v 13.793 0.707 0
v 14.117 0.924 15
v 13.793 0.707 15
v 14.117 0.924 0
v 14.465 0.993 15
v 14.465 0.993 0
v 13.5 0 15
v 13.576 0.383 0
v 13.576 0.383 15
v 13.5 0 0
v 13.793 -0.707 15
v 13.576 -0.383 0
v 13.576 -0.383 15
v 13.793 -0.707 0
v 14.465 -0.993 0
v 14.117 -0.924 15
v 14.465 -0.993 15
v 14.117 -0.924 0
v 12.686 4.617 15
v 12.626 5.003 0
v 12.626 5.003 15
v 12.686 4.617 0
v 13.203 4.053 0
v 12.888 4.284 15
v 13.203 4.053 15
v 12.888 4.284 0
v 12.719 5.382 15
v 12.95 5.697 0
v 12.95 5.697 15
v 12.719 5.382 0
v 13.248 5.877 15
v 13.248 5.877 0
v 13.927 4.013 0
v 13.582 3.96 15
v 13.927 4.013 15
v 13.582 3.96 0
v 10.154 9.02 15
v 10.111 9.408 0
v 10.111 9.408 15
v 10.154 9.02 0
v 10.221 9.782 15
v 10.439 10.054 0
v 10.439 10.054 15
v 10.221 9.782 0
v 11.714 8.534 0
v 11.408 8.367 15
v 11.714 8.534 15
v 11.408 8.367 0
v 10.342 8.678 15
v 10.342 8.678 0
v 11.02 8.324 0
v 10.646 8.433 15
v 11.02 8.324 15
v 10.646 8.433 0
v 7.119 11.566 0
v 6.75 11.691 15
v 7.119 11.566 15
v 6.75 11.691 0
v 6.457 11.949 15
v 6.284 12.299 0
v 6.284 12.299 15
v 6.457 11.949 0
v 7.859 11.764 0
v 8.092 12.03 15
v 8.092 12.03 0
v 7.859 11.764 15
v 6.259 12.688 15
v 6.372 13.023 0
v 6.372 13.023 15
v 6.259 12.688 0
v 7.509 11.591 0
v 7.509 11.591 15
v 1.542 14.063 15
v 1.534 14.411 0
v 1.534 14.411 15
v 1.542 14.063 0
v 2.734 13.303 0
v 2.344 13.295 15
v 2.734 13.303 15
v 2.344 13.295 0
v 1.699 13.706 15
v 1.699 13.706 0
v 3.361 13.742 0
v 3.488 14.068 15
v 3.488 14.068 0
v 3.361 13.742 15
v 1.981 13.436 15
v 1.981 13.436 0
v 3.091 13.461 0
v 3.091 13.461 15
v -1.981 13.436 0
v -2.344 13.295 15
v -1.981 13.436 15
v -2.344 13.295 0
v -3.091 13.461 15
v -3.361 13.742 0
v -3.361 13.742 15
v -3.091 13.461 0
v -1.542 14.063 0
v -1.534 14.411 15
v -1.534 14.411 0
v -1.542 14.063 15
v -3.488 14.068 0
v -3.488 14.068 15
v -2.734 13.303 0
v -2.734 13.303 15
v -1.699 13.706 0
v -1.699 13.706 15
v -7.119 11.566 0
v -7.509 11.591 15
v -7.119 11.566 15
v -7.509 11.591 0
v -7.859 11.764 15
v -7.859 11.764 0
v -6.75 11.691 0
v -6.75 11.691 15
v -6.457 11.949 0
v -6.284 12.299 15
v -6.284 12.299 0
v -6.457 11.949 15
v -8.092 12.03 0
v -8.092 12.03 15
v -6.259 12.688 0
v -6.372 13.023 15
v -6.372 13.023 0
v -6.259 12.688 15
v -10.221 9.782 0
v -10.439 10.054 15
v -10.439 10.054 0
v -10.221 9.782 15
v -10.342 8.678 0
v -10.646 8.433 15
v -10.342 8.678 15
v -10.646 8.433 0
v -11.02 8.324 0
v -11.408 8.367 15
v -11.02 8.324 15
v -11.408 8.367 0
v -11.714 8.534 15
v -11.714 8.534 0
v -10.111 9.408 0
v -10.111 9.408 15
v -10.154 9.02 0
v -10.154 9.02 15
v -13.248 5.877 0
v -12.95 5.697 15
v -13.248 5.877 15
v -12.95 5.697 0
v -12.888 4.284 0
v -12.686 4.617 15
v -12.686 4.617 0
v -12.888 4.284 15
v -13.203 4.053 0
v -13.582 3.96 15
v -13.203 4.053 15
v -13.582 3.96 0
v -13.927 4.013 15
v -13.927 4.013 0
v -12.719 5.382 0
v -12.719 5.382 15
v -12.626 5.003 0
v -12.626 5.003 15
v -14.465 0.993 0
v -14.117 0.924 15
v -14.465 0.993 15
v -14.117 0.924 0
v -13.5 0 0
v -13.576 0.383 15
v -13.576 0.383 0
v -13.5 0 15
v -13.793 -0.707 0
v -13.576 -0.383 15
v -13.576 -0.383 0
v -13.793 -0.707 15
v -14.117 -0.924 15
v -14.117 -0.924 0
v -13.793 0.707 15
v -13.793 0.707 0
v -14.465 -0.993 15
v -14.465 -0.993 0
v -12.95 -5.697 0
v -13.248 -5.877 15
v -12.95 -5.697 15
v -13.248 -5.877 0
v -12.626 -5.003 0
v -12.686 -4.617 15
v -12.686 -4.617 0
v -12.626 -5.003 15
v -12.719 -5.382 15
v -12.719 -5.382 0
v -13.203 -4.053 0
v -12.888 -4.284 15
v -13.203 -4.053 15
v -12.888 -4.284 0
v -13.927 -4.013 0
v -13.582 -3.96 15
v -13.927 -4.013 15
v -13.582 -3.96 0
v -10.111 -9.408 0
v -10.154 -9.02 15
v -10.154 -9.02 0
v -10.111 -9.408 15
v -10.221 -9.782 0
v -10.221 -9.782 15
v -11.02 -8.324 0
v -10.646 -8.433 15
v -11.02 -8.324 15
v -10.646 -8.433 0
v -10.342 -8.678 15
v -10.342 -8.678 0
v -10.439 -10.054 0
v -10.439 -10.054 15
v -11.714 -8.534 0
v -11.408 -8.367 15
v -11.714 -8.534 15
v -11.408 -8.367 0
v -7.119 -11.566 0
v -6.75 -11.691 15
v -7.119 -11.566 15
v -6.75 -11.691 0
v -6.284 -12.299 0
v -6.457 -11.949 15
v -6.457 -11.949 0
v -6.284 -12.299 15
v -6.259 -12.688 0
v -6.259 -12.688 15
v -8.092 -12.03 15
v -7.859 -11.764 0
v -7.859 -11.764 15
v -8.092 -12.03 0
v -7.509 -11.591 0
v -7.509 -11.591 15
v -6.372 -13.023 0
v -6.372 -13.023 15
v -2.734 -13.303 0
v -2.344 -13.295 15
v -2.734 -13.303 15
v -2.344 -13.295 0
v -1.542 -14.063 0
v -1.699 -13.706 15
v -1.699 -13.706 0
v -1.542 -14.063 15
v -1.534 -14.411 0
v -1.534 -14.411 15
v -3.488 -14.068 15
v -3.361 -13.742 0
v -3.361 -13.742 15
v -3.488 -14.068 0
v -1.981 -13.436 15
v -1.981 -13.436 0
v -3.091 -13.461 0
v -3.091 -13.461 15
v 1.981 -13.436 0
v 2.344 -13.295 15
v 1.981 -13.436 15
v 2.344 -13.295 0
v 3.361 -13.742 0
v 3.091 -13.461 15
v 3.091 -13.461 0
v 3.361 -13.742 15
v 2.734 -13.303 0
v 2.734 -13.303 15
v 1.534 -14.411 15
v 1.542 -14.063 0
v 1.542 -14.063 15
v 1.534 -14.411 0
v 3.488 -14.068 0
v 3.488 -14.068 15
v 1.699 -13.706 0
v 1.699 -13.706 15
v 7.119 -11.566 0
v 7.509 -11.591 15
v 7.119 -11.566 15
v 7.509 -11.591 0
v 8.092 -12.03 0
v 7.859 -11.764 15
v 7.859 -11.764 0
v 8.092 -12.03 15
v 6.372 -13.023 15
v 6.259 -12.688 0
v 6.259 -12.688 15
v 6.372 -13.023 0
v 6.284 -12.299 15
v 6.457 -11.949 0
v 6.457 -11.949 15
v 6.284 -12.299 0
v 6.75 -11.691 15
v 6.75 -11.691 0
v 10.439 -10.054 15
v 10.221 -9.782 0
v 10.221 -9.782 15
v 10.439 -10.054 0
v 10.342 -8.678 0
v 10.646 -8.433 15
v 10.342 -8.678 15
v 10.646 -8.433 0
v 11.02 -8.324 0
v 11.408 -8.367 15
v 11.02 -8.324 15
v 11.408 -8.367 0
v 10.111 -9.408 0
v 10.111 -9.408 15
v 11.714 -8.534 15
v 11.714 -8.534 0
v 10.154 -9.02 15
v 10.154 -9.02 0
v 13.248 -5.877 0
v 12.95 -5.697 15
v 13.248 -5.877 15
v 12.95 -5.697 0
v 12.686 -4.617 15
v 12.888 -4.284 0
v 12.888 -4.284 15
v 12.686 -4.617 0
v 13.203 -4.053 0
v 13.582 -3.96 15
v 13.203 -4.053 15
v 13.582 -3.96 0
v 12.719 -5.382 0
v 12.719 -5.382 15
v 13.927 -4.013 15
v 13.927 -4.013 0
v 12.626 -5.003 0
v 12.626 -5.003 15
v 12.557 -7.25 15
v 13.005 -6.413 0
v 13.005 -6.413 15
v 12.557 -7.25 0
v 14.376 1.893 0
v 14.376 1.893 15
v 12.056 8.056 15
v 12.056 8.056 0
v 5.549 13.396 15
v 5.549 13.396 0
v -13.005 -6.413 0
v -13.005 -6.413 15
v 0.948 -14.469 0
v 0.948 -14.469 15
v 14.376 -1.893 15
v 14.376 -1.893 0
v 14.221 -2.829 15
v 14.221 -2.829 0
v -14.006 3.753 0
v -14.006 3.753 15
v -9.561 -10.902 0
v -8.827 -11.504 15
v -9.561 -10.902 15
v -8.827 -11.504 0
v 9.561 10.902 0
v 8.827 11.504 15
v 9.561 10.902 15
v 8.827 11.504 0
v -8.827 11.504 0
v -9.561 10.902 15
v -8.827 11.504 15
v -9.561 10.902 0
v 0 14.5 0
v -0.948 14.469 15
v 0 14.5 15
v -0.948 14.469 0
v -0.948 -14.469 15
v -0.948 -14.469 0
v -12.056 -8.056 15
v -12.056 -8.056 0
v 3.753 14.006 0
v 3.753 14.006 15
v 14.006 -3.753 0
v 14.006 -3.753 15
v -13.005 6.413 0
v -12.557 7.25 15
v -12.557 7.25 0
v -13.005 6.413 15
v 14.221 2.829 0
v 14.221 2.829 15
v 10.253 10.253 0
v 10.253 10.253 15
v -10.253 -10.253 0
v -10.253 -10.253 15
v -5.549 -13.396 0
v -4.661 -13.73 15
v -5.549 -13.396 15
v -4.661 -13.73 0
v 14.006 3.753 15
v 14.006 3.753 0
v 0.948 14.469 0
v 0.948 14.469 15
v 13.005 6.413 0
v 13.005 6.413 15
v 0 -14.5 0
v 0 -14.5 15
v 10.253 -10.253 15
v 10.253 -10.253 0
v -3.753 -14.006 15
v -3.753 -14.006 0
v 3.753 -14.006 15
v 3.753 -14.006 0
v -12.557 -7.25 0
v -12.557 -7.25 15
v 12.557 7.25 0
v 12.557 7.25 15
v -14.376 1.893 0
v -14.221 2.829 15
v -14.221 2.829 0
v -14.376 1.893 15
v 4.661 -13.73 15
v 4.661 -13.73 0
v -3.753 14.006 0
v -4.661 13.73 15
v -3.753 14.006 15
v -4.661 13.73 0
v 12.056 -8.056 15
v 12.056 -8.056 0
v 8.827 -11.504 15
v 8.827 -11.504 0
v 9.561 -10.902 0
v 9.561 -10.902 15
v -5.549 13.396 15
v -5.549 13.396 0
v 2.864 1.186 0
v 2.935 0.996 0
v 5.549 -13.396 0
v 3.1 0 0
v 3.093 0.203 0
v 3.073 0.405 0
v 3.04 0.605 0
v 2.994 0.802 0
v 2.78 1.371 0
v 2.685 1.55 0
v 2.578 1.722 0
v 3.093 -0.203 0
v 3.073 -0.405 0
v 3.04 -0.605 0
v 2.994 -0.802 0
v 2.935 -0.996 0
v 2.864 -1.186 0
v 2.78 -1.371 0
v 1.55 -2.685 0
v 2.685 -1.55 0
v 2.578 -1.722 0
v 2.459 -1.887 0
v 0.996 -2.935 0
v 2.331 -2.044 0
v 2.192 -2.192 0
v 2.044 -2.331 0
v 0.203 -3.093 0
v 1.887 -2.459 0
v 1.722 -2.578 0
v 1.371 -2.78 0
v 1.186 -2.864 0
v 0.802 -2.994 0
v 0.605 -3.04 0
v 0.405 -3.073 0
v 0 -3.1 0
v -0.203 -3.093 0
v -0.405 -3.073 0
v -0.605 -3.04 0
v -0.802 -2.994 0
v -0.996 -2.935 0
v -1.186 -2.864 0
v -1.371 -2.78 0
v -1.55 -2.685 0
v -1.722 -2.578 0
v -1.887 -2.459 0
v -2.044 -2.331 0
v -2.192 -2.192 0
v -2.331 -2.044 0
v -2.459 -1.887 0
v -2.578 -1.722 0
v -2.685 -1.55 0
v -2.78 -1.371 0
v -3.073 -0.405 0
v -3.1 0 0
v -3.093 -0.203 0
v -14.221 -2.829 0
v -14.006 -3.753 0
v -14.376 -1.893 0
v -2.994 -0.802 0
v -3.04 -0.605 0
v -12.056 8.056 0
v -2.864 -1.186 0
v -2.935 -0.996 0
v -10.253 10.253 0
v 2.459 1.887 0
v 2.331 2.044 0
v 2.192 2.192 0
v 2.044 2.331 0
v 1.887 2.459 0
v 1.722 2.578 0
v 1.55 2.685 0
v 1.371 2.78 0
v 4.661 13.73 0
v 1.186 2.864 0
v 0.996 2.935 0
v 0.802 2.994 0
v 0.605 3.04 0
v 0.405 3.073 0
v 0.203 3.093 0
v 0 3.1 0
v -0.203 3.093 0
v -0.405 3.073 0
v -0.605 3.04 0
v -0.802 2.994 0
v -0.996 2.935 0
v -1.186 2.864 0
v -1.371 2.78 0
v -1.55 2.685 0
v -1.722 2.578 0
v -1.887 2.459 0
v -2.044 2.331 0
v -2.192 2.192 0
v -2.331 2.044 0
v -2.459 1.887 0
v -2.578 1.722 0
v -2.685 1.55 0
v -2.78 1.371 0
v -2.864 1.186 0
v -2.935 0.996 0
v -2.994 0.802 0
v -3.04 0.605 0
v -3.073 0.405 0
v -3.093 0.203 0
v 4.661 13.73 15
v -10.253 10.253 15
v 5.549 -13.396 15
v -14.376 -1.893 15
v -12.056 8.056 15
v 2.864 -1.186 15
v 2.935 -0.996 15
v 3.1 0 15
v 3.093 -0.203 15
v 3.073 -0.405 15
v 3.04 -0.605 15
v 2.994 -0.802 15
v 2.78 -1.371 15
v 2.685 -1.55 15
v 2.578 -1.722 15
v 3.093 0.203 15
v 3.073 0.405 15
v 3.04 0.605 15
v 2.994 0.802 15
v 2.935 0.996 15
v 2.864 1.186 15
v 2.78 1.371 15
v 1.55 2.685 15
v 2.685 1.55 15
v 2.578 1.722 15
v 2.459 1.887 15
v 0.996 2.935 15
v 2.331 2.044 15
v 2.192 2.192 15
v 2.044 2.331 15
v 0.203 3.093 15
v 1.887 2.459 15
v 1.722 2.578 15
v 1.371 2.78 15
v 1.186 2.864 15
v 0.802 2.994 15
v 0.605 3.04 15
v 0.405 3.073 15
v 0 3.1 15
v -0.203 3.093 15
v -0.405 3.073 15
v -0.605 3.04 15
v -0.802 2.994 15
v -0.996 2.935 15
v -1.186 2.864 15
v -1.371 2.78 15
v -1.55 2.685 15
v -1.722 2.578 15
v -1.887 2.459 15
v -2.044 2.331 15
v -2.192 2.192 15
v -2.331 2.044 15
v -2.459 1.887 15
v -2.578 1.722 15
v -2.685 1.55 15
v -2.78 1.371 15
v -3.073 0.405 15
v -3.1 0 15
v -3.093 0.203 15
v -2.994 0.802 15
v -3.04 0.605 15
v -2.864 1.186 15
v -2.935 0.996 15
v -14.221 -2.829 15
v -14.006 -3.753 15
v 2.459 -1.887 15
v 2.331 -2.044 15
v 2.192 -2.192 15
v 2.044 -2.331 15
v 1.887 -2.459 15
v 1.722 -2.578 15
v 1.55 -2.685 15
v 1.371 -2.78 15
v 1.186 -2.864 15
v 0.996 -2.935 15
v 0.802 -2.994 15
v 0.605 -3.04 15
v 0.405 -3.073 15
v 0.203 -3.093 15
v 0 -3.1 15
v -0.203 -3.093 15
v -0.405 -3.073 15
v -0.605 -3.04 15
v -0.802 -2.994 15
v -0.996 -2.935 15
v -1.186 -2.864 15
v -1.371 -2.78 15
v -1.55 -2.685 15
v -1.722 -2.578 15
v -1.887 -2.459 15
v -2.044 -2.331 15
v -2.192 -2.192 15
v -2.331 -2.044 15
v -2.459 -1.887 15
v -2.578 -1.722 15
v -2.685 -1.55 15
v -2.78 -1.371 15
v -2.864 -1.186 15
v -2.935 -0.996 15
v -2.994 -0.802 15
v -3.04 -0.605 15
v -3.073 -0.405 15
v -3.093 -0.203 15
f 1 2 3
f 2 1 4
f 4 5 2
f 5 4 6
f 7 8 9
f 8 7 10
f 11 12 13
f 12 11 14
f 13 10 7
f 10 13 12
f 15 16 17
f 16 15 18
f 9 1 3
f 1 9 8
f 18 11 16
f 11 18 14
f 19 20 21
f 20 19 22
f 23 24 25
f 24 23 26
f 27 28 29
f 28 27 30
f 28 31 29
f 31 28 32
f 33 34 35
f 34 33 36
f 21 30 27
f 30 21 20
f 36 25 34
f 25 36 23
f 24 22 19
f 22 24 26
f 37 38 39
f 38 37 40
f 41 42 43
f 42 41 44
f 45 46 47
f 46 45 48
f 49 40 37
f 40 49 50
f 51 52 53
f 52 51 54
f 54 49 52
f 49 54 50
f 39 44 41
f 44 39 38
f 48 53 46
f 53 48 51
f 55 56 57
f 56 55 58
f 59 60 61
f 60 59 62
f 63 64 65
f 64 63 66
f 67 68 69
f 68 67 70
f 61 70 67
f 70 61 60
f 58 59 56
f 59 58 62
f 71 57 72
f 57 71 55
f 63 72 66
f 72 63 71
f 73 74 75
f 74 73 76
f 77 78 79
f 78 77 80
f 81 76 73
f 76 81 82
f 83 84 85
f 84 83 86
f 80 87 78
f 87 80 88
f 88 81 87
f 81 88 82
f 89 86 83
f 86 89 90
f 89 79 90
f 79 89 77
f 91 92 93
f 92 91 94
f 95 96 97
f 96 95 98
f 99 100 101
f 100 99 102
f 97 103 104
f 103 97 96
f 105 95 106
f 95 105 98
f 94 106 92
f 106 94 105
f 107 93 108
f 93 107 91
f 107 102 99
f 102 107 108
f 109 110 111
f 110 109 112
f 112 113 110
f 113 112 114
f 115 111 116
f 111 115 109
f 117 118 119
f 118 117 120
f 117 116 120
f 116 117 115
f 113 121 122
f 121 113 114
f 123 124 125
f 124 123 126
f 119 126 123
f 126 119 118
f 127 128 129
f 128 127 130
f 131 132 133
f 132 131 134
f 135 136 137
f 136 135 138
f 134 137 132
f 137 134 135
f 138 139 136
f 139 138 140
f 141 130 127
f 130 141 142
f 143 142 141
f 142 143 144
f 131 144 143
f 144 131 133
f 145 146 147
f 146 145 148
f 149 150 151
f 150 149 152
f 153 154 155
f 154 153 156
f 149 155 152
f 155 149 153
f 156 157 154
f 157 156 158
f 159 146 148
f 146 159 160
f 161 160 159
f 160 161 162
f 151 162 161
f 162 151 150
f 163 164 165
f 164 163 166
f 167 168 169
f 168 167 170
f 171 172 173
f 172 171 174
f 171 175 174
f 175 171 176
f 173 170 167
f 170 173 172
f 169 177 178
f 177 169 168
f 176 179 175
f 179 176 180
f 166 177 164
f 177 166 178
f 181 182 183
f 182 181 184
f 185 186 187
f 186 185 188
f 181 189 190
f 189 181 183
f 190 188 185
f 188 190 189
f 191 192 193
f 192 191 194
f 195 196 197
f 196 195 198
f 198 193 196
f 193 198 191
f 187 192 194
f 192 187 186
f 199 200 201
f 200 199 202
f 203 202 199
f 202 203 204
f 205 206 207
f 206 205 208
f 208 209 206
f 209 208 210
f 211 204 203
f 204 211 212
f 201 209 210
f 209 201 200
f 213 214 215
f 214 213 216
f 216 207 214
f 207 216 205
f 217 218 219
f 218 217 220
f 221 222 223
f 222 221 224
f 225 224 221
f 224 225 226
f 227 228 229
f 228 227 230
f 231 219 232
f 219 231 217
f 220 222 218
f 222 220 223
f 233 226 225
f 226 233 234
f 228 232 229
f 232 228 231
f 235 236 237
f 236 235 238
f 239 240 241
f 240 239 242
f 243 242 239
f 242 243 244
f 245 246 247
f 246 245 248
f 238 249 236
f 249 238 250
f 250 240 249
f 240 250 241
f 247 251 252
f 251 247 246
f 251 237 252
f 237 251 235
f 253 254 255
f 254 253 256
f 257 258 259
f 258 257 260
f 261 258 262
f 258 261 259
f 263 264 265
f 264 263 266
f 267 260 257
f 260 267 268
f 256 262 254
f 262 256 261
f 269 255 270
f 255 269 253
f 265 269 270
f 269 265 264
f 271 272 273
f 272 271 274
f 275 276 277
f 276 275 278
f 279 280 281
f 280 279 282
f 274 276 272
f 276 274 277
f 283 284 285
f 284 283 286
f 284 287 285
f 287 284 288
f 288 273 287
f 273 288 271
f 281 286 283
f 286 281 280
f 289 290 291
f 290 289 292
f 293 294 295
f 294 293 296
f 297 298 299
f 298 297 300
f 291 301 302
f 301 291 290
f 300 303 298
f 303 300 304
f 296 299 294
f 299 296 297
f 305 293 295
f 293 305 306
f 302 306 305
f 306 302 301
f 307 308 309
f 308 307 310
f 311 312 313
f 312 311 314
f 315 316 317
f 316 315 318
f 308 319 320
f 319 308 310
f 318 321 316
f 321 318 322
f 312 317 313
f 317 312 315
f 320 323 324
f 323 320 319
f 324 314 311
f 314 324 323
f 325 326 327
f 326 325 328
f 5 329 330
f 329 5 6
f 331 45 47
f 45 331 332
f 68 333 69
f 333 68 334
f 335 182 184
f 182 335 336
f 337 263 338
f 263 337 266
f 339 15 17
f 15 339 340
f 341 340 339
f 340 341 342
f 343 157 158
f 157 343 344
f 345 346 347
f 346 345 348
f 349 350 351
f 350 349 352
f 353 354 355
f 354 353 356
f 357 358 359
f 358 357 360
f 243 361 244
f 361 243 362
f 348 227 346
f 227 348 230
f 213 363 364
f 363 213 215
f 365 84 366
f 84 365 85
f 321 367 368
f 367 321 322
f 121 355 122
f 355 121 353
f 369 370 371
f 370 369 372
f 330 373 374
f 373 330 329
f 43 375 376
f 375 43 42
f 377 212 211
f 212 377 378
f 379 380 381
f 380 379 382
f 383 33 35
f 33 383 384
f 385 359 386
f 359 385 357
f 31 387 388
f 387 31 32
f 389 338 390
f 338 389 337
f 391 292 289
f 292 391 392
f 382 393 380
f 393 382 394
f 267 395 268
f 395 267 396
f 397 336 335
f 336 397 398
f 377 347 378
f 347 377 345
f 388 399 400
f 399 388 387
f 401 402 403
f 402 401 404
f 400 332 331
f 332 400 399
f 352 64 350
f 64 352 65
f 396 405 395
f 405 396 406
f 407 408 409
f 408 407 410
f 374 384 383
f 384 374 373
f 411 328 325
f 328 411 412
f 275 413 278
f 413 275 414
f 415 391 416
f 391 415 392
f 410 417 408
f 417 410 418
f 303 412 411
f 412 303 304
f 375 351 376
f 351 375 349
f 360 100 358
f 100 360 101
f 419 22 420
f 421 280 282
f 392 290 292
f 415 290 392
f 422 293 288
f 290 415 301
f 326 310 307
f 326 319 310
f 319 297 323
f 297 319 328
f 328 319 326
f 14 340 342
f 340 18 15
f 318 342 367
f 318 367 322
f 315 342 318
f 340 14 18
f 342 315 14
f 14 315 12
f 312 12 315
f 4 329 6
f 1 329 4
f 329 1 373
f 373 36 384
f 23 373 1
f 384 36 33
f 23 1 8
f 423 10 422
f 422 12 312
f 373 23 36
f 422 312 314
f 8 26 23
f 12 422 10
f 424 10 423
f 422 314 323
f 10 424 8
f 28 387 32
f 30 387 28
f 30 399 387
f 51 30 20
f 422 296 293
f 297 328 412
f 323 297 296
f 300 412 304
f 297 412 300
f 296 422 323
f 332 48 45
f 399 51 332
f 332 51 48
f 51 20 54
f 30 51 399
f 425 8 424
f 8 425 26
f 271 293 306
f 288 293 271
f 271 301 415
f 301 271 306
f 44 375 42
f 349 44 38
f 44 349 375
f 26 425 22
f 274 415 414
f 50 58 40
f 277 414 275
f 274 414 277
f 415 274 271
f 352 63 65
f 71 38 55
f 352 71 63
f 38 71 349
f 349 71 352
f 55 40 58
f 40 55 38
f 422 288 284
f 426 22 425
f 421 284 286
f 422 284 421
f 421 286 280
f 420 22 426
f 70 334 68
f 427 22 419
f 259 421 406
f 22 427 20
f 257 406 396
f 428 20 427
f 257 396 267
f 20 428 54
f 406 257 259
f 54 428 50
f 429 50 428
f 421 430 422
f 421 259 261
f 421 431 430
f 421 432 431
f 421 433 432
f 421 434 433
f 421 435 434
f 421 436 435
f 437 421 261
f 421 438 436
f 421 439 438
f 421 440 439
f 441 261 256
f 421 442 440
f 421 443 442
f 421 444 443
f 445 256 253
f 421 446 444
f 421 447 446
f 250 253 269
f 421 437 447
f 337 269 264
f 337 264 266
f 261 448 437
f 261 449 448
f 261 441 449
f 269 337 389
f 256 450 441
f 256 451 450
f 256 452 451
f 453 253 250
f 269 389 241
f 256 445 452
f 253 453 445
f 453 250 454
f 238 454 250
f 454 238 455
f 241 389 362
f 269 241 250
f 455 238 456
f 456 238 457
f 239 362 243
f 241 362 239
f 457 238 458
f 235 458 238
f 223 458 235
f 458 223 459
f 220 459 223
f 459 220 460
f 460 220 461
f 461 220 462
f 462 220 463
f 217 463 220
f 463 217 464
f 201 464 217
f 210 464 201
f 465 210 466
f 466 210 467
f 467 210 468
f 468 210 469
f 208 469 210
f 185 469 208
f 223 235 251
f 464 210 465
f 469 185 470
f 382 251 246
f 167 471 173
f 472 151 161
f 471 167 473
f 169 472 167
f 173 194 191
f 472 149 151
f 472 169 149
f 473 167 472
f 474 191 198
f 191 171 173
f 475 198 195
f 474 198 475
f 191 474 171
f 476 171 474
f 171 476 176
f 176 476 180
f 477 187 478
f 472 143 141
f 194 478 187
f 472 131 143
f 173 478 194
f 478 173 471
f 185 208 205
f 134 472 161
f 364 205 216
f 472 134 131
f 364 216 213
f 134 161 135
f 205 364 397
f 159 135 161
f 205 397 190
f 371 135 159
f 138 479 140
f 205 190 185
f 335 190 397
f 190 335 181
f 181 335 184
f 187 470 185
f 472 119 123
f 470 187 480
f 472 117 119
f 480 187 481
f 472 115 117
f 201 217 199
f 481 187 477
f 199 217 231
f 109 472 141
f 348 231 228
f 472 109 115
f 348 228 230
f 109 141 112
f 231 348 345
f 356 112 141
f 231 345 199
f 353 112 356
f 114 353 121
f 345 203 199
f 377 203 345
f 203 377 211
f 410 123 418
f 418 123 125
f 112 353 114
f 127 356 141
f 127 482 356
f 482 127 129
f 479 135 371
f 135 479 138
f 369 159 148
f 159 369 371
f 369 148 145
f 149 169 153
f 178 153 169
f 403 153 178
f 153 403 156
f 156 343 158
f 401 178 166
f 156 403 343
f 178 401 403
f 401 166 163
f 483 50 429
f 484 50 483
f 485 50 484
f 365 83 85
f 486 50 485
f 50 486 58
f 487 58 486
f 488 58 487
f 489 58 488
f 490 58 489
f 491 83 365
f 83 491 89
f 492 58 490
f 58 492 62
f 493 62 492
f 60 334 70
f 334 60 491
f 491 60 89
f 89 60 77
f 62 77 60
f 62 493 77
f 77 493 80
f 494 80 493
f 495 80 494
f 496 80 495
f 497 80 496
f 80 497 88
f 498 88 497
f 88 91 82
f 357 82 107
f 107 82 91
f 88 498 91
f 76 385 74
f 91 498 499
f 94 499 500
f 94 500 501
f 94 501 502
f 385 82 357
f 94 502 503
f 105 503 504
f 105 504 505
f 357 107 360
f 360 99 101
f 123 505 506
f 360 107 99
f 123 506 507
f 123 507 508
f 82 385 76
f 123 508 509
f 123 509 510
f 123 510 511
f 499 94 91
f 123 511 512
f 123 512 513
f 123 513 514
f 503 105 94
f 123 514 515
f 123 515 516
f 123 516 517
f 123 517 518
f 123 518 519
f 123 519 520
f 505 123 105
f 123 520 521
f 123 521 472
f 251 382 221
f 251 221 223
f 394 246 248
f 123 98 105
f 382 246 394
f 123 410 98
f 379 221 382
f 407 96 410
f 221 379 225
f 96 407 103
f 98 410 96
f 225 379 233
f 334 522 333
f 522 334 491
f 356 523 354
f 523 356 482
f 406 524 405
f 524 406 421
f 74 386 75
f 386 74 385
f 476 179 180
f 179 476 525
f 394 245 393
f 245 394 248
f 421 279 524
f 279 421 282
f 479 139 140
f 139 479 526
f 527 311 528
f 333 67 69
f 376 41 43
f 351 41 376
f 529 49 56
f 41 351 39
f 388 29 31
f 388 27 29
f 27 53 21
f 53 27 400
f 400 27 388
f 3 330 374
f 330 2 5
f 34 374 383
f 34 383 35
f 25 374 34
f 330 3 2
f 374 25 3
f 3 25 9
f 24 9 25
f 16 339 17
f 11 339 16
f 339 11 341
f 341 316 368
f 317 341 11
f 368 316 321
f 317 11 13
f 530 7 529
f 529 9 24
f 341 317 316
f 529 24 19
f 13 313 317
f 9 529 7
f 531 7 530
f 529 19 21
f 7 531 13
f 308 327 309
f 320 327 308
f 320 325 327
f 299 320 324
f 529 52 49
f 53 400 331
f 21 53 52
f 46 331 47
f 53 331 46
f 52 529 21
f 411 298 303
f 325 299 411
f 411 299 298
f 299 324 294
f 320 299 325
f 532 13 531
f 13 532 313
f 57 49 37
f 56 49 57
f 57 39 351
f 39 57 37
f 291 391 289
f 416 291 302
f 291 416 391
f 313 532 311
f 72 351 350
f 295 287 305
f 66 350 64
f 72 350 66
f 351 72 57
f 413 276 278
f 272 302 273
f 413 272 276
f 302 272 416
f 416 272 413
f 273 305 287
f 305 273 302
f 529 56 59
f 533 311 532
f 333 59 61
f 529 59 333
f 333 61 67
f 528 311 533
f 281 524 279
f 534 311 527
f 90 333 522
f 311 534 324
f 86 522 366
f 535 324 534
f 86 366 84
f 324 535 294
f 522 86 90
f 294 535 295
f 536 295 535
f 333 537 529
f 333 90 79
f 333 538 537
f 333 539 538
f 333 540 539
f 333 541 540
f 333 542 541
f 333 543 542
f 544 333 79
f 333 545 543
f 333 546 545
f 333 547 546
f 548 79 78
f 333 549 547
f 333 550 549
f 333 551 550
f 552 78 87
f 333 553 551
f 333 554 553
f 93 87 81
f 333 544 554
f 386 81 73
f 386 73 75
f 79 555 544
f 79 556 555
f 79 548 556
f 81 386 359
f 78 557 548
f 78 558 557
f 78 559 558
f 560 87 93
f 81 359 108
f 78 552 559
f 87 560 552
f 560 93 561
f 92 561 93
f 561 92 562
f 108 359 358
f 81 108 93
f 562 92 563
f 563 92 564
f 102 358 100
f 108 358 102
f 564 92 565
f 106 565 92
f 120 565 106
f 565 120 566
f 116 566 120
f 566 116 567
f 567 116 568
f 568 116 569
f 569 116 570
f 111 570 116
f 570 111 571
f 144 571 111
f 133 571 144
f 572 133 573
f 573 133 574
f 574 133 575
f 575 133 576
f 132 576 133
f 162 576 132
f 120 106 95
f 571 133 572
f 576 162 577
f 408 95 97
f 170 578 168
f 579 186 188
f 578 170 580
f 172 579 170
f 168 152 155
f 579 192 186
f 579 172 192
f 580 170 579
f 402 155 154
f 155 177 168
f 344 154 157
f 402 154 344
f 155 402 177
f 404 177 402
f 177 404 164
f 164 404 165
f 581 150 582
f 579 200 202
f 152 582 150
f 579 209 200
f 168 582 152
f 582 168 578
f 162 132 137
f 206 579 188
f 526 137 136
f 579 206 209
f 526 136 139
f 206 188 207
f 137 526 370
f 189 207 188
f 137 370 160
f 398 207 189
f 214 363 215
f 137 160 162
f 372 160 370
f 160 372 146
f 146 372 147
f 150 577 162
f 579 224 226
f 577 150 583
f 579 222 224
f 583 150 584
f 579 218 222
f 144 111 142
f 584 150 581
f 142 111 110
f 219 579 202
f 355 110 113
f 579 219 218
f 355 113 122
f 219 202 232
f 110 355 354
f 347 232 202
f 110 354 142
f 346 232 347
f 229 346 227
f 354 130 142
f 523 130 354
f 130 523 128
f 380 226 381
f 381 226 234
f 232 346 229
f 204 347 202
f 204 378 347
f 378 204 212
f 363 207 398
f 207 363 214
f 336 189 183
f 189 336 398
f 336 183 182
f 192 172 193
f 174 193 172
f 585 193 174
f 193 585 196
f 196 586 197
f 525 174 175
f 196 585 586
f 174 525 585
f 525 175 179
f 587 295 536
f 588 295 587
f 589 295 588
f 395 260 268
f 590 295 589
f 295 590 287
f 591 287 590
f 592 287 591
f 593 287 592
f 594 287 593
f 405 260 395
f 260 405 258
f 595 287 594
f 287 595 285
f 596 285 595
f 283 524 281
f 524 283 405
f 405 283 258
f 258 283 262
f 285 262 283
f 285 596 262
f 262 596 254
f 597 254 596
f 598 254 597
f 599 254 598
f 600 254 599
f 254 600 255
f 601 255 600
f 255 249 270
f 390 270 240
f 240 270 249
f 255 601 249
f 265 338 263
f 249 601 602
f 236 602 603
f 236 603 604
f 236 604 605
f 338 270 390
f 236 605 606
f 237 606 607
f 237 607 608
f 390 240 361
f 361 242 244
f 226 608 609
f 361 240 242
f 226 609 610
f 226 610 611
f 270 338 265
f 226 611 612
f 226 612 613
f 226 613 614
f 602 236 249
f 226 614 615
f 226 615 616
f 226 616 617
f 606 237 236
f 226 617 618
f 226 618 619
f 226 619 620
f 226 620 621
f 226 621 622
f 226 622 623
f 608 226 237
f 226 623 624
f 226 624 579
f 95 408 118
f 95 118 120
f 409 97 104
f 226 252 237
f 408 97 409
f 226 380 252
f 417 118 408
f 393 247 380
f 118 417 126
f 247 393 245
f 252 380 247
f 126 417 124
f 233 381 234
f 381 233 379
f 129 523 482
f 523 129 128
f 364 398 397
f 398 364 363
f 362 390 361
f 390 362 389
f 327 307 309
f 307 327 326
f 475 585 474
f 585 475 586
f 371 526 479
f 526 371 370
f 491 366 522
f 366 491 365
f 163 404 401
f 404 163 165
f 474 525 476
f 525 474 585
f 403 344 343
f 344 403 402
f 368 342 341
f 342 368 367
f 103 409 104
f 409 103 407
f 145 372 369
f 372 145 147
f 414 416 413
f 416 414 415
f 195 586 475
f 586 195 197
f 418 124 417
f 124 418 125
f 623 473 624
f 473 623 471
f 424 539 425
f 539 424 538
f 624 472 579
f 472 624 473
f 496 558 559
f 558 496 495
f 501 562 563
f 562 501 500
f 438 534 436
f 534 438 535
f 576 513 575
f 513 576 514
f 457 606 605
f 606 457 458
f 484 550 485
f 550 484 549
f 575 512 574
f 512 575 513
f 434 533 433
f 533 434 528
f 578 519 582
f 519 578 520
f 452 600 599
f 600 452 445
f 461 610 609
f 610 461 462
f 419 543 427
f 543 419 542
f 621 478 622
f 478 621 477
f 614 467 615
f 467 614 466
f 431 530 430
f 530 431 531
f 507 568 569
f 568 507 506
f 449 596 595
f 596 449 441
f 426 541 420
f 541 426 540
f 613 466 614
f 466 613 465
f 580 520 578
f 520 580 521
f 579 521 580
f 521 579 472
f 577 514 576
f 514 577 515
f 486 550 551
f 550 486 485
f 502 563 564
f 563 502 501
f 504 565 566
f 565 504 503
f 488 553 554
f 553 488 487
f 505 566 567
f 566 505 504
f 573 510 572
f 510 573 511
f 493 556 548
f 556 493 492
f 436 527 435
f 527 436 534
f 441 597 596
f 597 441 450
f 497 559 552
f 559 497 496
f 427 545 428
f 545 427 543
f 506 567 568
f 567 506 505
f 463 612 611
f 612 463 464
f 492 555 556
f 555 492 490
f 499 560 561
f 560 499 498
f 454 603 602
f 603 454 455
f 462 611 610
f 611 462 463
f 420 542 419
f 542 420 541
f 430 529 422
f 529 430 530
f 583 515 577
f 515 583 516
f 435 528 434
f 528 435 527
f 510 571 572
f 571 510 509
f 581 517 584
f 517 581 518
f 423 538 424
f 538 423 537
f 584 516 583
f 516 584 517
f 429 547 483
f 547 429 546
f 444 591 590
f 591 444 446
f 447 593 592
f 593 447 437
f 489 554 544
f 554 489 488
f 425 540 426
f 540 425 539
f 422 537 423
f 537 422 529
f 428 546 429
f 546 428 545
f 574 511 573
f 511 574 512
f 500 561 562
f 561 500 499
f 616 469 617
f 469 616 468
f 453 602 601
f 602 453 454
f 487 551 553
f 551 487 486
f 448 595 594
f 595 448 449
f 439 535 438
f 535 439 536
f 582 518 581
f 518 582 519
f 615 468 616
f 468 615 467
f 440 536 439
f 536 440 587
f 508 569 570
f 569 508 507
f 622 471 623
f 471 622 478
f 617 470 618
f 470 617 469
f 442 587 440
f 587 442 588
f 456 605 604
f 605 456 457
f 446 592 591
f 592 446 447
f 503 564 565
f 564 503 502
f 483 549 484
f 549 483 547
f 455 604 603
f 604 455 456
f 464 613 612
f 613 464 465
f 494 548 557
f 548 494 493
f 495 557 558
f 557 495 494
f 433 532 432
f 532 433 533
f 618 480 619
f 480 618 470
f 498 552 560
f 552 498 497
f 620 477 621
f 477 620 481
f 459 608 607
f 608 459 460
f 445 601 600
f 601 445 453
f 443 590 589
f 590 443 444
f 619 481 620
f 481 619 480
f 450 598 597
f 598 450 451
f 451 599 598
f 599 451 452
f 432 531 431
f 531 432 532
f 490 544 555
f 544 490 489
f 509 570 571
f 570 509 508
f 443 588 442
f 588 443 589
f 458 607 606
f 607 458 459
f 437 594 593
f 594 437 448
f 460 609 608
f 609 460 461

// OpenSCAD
// Replacement knob for hotplate stirrer (D-shaft 6 mm)
// Print orientation: bottom face (with D-bore) on the bed, z = 0

// ---------------- Parameters ----------------
knob_d        = 30;    // knob outer diameter
knob_h        = 15;    // knob height
shaft_d       = 6.2;   // D-bore diameter
shaft_flat    = 4.7;   // distance from D flat to opposite side
groove_count  = 18;    // number of vertical grip grooves
groove_d      = 2;     // groove diameter (half-cylinder)
pointer_w     = 1.5;   // pointer groove width
pointer_d     = 1;     // pointer groove depth
eps           = 0.5;   // overcut for clean differences

$fn = 96;

// ---------------- Derived ----------------
D = knob_d - 2 * eps;                       // outer cylinder diameter
R = D / 2;
pitch = 360 / groove_count;                // groove angular spacing

// ---------------- Model ----------------
difference() {
    // Main body
    cylinder(d = D, h = knob_h);

    // D-shaped blind bore from bottom face
    translate([0, 0, -eps])
        linear_extrude(height = knob_h + 2 * eps)
            hull() {
                circle(d = shaft_d);
                translate([-(shaft_d - shaft_flat) / 2, 0, 0])
                    square([shaft_d - shaft_flat, shaft_d - shaft_flat]);
            }

    // Vertical grip grooves along full height
    for (i = [0 : groove_count - 1])
        rotate([0, 0, pitch * i])
            translate([R, 0, -eps])
                cylinder(d = groove_d, h = knob_h + 2 * eps, $fn = 16);

    // Pointer groove on top face, centred on +X axis
    translate([0, 0, knob_h - pointer_d])
        rotate([90, 0, 0])
            linear_extrude(height = pointer_d)
                polygon([
                    [0, 0],
                    [R, 0],
                    [R - pointer_w / 2, pointer_w / 2],
                    [R - pointer_w / 2, -pointer_w / 2]
                ]);
}
